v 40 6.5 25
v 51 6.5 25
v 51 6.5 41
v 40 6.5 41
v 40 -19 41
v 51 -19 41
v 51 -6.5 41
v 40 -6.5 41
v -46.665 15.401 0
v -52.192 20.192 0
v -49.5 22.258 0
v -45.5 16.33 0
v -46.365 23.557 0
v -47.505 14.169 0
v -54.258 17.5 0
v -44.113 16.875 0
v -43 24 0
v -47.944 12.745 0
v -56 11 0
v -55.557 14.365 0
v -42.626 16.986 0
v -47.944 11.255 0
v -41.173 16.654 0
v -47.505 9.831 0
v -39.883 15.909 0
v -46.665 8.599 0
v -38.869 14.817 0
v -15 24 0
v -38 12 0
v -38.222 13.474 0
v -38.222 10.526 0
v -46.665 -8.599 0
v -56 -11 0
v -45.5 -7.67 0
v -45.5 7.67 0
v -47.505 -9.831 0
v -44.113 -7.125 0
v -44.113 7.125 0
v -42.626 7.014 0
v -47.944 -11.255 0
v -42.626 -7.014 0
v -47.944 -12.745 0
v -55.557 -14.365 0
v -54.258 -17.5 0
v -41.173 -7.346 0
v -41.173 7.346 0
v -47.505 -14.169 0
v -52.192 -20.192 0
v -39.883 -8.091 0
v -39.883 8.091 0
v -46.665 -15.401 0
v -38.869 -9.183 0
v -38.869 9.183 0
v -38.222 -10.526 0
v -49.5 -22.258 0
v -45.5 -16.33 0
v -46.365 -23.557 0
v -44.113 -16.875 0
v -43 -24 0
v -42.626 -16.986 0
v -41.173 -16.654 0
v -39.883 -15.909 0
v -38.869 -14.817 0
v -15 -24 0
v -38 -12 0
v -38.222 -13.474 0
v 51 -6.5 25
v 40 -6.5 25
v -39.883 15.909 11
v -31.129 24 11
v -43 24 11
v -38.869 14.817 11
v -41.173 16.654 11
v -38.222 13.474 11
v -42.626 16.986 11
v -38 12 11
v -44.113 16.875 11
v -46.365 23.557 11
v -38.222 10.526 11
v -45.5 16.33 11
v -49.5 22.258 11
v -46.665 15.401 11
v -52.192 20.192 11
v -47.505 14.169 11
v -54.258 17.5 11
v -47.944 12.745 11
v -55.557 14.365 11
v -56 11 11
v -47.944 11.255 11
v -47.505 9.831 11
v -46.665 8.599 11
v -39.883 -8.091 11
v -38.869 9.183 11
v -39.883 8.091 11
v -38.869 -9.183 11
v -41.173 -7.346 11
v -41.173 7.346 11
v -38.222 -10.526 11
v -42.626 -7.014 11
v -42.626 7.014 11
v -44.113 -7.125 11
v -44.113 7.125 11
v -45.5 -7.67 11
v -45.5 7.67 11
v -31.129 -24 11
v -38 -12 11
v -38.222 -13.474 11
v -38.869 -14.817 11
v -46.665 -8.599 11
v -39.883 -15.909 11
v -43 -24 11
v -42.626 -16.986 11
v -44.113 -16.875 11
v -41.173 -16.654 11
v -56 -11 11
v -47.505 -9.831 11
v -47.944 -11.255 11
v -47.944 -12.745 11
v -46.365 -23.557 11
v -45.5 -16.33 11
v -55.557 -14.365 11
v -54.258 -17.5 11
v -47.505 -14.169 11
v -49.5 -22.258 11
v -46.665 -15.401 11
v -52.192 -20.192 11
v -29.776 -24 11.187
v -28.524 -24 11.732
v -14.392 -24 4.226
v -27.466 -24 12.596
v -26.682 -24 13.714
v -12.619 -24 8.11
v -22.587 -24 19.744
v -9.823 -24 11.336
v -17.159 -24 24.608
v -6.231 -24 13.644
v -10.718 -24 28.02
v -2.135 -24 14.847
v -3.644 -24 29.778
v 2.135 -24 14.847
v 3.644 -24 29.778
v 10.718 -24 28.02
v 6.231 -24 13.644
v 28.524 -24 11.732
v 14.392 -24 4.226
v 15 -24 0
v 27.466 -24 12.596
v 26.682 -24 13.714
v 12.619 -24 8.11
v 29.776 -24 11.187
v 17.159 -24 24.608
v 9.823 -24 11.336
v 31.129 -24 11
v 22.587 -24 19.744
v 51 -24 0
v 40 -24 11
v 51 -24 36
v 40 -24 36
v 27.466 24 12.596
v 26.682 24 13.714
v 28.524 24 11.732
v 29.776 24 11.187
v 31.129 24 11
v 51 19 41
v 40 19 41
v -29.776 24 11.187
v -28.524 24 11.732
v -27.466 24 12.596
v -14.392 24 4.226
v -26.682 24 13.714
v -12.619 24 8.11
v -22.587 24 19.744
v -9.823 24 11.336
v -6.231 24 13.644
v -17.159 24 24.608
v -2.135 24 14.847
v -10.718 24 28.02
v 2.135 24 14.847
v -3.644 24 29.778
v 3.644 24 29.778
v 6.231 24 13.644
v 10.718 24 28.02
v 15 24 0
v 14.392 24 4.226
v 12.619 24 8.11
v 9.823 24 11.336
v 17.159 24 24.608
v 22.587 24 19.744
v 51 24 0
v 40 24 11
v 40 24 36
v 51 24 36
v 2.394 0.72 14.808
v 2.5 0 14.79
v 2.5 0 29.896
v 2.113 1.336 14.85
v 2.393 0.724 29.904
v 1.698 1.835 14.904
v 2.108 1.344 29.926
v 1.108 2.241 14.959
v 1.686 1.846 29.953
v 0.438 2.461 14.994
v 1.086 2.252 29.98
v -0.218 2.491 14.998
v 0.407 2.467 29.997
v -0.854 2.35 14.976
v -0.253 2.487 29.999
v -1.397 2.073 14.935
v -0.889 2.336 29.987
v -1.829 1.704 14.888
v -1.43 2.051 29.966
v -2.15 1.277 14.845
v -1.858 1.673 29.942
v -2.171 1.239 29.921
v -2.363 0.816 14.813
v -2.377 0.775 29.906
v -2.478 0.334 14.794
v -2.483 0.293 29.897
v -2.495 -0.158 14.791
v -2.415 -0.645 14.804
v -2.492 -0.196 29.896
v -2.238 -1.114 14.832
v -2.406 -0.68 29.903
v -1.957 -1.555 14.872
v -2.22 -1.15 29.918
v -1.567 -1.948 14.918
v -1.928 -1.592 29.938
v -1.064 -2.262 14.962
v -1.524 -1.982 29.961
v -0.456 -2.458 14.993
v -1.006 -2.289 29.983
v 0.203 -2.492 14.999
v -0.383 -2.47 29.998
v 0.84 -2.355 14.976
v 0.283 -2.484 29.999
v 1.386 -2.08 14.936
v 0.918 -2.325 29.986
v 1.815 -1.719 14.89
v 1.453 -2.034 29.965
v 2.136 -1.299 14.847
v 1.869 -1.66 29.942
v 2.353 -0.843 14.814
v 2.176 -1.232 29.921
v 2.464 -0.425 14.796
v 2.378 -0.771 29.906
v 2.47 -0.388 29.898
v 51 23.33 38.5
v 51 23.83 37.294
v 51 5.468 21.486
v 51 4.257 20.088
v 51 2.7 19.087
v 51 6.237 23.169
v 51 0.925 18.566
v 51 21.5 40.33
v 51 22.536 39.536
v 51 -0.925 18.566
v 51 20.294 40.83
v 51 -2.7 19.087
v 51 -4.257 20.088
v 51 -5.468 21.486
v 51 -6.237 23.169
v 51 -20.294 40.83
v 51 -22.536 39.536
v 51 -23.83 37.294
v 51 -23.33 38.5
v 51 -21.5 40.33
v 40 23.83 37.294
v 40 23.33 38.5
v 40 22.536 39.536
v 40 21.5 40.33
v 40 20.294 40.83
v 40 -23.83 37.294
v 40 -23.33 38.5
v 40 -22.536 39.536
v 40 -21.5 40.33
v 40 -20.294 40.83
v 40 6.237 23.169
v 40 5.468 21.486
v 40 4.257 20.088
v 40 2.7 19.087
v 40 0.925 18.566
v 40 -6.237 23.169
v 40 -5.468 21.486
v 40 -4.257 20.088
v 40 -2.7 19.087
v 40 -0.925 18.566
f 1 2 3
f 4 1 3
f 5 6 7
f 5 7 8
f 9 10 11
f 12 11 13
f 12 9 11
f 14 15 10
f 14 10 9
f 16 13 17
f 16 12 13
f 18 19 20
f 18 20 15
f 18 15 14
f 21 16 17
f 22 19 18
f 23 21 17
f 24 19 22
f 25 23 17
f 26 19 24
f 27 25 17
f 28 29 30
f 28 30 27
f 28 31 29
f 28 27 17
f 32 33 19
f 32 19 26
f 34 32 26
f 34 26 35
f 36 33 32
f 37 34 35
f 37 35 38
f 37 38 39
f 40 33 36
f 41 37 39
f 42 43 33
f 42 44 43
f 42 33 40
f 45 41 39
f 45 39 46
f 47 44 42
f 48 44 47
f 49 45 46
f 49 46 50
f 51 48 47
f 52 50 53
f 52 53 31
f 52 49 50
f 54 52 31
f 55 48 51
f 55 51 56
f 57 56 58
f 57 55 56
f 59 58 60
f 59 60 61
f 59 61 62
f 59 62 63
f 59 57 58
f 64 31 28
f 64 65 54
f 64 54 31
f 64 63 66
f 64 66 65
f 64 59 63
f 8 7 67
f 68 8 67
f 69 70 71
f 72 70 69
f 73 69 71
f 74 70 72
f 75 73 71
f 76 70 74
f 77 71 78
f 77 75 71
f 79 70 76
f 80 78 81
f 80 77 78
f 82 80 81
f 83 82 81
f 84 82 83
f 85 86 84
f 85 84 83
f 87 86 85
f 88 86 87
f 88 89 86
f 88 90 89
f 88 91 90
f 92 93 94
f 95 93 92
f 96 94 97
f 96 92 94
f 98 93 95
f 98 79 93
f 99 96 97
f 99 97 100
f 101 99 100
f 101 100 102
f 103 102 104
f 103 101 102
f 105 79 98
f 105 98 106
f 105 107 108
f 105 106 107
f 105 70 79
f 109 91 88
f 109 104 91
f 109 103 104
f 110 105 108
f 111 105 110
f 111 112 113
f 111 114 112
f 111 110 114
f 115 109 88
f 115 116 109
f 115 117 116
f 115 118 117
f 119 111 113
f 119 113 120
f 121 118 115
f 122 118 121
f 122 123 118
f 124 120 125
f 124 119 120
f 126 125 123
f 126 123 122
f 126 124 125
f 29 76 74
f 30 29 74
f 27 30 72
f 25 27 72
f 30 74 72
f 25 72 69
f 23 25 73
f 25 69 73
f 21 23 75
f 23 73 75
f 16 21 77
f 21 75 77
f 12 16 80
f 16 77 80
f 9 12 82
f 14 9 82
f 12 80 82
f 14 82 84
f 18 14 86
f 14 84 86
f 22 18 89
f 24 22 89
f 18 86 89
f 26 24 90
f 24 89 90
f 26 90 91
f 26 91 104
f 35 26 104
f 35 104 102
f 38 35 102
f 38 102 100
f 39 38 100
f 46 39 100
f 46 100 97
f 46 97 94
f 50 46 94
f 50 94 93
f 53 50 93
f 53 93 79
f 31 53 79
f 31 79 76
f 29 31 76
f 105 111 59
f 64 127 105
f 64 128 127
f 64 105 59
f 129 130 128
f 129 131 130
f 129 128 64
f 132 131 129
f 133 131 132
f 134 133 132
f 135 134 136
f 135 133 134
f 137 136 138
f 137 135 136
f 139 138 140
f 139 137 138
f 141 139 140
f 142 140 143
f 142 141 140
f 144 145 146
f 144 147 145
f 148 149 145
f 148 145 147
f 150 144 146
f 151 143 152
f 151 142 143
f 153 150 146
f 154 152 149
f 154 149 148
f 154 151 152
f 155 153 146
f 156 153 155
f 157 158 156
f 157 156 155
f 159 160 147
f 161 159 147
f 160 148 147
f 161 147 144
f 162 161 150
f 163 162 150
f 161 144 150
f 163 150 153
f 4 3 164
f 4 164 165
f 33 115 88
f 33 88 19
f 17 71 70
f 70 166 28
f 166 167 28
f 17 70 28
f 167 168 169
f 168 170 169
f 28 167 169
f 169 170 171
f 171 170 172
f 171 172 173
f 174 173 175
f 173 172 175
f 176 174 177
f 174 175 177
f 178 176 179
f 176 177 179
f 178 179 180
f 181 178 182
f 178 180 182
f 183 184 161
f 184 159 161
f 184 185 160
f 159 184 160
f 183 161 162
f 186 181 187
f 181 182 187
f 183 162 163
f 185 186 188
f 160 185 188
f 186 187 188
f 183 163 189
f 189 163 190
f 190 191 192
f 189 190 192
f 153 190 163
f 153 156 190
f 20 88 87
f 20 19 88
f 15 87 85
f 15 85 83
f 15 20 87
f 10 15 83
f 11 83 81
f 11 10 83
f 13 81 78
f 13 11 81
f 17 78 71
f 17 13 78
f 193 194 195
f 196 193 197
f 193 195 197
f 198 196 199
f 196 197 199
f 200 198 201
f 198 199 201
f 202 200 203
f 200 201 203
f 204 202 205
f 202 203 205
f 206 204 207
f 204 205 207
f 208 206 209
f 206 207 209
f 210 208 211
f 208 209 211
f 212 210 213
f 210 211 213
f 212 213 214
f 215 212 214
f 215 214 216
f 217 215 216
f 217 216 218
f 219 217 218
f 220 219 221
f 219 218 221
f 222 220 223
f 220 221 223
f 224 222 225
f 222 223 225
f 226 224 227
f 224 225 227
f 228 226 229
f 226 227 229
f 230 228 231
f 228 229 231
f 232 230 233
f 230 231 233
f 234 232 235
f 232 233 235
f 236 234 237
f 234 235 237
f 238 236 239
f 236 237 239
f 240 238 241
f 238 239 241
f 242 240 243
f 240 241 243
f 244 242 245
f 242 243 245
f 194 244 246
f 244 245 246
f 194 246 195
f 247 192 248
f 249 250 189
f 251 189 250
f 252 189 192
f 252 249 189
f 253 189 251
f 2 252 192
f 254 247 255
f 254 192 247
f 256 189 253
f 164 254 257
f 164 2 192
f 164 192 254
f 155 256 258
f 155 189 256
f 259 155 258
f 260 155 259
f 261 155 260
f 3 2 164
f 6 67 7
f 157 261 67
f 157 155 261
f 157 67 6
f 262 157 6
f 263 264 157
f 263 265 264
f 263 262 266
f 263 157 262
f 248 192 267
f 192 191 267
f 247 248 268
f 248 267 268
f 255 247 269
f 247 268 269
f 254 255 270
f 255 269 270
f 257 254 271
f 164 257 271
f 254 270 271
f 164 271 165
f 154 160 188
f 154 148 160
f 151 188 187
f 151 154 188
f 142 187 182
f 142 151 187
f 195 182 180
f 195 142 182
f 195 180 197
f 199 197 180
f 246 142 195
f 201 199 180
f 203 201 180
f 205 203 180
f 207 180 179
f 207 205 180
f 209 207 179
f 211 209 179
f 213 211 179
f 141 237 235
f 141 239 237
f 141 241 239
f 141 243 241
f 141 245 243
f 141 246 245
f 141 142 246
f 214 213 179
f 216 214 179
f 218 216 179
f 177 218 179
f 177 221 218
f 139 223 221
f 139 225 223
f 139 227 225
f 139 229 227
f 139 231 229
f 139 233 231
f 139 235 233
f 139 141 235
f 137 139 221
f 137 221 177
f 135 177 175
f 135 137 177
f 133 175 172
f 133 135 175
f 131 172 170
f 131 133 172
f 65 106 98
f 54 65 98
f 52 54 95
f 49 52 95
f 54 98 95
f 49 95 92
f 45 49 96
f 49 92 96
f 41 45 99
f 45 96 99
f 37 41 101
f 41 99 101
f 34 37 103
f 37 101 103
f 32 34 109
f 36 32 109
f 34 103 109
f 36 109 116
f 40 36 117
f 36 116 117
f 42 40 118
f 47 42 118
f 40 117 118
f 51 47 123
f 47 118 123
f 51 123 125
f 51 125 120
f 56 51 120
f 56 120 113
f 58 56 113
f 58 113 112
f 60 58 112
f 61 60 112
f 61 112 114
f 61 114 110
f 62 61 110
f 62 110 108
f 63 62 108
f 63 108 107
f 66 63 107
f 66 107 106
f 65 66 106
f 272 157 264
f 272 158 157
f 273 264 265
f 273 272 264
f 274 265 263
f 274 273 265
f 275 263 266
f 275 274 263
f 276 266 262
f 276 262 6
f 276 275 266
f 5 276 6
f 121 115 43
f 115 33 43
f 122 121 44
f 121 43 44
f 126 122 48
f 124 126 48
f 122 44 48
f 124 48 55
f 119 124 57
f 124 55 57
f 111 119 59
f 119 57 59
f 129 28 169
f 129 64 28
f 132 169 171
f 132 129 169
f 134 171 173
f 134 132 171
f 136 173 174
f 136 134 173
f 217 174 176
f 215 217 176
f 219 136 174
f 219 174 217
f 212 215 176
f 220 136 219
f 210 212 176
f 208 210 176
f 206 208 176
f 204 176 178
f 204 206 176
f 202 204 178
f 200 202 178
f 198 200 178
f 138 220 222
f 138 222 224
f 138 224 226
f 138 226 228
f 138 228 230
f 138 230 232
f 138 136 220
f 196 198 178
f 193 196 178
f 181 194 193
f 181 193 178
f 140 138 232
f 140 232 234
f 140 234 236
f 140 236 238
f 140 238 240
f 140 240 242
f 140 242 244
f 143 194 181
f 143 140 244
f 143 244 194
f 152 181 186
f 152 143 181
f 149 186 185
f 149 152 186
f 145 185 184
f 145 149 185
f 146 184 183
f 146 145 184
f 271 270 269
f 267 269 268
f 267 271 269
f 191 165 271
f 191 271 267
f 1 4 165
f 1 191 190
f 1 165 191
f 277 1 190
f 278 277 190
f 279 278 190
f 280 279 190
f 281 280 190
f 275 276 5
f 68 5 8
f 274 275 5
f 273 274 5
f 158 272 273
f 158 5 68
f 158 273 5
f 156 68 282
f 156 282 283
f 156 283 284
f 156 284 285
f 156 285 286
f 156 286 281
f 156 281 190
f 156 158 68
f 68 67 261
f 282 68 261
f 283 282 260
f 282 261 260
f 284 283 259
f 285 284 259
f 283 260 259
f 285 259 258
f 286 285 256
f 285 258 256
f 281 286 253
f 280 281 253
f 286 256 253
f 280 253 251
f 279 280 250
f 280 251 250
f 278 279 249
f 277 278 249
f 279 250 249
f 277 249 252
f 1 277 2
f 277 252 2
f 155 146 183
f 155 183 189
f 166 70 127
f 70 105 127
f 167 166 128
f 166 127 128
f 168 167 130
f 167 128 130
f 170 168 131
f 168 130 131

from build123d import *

# Parameters (mm, degrees)
F1_DEPTH      = 24
F2_R          = 13
F3_R          = 5
F4_R          = 5
F4_R_2        = 2.5
F5_DEPTH      = 44.4
F7_DEPTH      = 15.7
F7_DEPTH_BACK = 25


with BuildPart() as f1:
    # F0 (on Front) → F1 (new body, symmetric)
    with BuildSketch(Plane.XZ):
        with BuildLine():
            ThreePointArc((-15, 0), (0, 15), (15, 0))
            Line((15, 0), (51, 0))
            Line((51, 0), (51, 41))
            Line((51, 41), (40, 41))
            Line((40, 41), (40, 11))
            Line((40, 11), (27.9105714739, 11))
            ThreePointArc((27.9105714739, 11), (0, 30), (-27.9105714739, 11))
            Line((-27.9105714739, 11), (-56, 11))
            Line((-56, 11), (-56, 0))
            Line((-56, 0), (-15, 0))
        make_face()
    extrude(amount=F1_DEPTH, both=True)

    # F2
    f2_edges = [f1.edges().sort_by_distance(p)[0] for p in [
        (-56, -24, 5.5),
        (-56, 24, 5.5),
    ]]
    fillet(f2_edges, radius=F2_R)

    # F3
    f3_edges = [f1.edges().sort_by_distance(p)[0] for p in [
        (45.5, -24, 41),
        (45.5, 24, 41),
        (-27.910571, 0, 11),
        (27.910571, 0, 11),
    ]]
    fillet(f3_edges, radius=F3_R)

    # F4 (on face) → F5 (cut, symmetric)
    with BuildSketch(Plane.XY.offset(11)):
        with Locations((-43, 12)):
            Circle(F4_R)
        with Locations((-43, -12)):
            Circle(F4_R)
        Circle(F4_R_2)
    extrude(amount=F5_DEPTH, both=True, mode=Mode.SUBTRACT)

    # F6 (on face) → F7 (cut, two sides)
    with BuildSketch(Plane.YZ.offset(51)) as f7_sk:
        with BuildLine():
            Line((6.5, 41), (-6.5, 41))
            Line((-6.5, 41), (-6.5, 25))
            ThreePointArc((-6.5, 25), (0, 18.5), (6.5, 25))
            Line((6.5, 25), (6.5, 41))
        make_face()
    extrude(amount=-F7_DEPTH, mode=Mode.SUBTRACT)
    extrude(f7_sk.sketch, amount=F7_DEPTH_BACK, mode=Mode.SUBTRACT)


solid = f1.part
